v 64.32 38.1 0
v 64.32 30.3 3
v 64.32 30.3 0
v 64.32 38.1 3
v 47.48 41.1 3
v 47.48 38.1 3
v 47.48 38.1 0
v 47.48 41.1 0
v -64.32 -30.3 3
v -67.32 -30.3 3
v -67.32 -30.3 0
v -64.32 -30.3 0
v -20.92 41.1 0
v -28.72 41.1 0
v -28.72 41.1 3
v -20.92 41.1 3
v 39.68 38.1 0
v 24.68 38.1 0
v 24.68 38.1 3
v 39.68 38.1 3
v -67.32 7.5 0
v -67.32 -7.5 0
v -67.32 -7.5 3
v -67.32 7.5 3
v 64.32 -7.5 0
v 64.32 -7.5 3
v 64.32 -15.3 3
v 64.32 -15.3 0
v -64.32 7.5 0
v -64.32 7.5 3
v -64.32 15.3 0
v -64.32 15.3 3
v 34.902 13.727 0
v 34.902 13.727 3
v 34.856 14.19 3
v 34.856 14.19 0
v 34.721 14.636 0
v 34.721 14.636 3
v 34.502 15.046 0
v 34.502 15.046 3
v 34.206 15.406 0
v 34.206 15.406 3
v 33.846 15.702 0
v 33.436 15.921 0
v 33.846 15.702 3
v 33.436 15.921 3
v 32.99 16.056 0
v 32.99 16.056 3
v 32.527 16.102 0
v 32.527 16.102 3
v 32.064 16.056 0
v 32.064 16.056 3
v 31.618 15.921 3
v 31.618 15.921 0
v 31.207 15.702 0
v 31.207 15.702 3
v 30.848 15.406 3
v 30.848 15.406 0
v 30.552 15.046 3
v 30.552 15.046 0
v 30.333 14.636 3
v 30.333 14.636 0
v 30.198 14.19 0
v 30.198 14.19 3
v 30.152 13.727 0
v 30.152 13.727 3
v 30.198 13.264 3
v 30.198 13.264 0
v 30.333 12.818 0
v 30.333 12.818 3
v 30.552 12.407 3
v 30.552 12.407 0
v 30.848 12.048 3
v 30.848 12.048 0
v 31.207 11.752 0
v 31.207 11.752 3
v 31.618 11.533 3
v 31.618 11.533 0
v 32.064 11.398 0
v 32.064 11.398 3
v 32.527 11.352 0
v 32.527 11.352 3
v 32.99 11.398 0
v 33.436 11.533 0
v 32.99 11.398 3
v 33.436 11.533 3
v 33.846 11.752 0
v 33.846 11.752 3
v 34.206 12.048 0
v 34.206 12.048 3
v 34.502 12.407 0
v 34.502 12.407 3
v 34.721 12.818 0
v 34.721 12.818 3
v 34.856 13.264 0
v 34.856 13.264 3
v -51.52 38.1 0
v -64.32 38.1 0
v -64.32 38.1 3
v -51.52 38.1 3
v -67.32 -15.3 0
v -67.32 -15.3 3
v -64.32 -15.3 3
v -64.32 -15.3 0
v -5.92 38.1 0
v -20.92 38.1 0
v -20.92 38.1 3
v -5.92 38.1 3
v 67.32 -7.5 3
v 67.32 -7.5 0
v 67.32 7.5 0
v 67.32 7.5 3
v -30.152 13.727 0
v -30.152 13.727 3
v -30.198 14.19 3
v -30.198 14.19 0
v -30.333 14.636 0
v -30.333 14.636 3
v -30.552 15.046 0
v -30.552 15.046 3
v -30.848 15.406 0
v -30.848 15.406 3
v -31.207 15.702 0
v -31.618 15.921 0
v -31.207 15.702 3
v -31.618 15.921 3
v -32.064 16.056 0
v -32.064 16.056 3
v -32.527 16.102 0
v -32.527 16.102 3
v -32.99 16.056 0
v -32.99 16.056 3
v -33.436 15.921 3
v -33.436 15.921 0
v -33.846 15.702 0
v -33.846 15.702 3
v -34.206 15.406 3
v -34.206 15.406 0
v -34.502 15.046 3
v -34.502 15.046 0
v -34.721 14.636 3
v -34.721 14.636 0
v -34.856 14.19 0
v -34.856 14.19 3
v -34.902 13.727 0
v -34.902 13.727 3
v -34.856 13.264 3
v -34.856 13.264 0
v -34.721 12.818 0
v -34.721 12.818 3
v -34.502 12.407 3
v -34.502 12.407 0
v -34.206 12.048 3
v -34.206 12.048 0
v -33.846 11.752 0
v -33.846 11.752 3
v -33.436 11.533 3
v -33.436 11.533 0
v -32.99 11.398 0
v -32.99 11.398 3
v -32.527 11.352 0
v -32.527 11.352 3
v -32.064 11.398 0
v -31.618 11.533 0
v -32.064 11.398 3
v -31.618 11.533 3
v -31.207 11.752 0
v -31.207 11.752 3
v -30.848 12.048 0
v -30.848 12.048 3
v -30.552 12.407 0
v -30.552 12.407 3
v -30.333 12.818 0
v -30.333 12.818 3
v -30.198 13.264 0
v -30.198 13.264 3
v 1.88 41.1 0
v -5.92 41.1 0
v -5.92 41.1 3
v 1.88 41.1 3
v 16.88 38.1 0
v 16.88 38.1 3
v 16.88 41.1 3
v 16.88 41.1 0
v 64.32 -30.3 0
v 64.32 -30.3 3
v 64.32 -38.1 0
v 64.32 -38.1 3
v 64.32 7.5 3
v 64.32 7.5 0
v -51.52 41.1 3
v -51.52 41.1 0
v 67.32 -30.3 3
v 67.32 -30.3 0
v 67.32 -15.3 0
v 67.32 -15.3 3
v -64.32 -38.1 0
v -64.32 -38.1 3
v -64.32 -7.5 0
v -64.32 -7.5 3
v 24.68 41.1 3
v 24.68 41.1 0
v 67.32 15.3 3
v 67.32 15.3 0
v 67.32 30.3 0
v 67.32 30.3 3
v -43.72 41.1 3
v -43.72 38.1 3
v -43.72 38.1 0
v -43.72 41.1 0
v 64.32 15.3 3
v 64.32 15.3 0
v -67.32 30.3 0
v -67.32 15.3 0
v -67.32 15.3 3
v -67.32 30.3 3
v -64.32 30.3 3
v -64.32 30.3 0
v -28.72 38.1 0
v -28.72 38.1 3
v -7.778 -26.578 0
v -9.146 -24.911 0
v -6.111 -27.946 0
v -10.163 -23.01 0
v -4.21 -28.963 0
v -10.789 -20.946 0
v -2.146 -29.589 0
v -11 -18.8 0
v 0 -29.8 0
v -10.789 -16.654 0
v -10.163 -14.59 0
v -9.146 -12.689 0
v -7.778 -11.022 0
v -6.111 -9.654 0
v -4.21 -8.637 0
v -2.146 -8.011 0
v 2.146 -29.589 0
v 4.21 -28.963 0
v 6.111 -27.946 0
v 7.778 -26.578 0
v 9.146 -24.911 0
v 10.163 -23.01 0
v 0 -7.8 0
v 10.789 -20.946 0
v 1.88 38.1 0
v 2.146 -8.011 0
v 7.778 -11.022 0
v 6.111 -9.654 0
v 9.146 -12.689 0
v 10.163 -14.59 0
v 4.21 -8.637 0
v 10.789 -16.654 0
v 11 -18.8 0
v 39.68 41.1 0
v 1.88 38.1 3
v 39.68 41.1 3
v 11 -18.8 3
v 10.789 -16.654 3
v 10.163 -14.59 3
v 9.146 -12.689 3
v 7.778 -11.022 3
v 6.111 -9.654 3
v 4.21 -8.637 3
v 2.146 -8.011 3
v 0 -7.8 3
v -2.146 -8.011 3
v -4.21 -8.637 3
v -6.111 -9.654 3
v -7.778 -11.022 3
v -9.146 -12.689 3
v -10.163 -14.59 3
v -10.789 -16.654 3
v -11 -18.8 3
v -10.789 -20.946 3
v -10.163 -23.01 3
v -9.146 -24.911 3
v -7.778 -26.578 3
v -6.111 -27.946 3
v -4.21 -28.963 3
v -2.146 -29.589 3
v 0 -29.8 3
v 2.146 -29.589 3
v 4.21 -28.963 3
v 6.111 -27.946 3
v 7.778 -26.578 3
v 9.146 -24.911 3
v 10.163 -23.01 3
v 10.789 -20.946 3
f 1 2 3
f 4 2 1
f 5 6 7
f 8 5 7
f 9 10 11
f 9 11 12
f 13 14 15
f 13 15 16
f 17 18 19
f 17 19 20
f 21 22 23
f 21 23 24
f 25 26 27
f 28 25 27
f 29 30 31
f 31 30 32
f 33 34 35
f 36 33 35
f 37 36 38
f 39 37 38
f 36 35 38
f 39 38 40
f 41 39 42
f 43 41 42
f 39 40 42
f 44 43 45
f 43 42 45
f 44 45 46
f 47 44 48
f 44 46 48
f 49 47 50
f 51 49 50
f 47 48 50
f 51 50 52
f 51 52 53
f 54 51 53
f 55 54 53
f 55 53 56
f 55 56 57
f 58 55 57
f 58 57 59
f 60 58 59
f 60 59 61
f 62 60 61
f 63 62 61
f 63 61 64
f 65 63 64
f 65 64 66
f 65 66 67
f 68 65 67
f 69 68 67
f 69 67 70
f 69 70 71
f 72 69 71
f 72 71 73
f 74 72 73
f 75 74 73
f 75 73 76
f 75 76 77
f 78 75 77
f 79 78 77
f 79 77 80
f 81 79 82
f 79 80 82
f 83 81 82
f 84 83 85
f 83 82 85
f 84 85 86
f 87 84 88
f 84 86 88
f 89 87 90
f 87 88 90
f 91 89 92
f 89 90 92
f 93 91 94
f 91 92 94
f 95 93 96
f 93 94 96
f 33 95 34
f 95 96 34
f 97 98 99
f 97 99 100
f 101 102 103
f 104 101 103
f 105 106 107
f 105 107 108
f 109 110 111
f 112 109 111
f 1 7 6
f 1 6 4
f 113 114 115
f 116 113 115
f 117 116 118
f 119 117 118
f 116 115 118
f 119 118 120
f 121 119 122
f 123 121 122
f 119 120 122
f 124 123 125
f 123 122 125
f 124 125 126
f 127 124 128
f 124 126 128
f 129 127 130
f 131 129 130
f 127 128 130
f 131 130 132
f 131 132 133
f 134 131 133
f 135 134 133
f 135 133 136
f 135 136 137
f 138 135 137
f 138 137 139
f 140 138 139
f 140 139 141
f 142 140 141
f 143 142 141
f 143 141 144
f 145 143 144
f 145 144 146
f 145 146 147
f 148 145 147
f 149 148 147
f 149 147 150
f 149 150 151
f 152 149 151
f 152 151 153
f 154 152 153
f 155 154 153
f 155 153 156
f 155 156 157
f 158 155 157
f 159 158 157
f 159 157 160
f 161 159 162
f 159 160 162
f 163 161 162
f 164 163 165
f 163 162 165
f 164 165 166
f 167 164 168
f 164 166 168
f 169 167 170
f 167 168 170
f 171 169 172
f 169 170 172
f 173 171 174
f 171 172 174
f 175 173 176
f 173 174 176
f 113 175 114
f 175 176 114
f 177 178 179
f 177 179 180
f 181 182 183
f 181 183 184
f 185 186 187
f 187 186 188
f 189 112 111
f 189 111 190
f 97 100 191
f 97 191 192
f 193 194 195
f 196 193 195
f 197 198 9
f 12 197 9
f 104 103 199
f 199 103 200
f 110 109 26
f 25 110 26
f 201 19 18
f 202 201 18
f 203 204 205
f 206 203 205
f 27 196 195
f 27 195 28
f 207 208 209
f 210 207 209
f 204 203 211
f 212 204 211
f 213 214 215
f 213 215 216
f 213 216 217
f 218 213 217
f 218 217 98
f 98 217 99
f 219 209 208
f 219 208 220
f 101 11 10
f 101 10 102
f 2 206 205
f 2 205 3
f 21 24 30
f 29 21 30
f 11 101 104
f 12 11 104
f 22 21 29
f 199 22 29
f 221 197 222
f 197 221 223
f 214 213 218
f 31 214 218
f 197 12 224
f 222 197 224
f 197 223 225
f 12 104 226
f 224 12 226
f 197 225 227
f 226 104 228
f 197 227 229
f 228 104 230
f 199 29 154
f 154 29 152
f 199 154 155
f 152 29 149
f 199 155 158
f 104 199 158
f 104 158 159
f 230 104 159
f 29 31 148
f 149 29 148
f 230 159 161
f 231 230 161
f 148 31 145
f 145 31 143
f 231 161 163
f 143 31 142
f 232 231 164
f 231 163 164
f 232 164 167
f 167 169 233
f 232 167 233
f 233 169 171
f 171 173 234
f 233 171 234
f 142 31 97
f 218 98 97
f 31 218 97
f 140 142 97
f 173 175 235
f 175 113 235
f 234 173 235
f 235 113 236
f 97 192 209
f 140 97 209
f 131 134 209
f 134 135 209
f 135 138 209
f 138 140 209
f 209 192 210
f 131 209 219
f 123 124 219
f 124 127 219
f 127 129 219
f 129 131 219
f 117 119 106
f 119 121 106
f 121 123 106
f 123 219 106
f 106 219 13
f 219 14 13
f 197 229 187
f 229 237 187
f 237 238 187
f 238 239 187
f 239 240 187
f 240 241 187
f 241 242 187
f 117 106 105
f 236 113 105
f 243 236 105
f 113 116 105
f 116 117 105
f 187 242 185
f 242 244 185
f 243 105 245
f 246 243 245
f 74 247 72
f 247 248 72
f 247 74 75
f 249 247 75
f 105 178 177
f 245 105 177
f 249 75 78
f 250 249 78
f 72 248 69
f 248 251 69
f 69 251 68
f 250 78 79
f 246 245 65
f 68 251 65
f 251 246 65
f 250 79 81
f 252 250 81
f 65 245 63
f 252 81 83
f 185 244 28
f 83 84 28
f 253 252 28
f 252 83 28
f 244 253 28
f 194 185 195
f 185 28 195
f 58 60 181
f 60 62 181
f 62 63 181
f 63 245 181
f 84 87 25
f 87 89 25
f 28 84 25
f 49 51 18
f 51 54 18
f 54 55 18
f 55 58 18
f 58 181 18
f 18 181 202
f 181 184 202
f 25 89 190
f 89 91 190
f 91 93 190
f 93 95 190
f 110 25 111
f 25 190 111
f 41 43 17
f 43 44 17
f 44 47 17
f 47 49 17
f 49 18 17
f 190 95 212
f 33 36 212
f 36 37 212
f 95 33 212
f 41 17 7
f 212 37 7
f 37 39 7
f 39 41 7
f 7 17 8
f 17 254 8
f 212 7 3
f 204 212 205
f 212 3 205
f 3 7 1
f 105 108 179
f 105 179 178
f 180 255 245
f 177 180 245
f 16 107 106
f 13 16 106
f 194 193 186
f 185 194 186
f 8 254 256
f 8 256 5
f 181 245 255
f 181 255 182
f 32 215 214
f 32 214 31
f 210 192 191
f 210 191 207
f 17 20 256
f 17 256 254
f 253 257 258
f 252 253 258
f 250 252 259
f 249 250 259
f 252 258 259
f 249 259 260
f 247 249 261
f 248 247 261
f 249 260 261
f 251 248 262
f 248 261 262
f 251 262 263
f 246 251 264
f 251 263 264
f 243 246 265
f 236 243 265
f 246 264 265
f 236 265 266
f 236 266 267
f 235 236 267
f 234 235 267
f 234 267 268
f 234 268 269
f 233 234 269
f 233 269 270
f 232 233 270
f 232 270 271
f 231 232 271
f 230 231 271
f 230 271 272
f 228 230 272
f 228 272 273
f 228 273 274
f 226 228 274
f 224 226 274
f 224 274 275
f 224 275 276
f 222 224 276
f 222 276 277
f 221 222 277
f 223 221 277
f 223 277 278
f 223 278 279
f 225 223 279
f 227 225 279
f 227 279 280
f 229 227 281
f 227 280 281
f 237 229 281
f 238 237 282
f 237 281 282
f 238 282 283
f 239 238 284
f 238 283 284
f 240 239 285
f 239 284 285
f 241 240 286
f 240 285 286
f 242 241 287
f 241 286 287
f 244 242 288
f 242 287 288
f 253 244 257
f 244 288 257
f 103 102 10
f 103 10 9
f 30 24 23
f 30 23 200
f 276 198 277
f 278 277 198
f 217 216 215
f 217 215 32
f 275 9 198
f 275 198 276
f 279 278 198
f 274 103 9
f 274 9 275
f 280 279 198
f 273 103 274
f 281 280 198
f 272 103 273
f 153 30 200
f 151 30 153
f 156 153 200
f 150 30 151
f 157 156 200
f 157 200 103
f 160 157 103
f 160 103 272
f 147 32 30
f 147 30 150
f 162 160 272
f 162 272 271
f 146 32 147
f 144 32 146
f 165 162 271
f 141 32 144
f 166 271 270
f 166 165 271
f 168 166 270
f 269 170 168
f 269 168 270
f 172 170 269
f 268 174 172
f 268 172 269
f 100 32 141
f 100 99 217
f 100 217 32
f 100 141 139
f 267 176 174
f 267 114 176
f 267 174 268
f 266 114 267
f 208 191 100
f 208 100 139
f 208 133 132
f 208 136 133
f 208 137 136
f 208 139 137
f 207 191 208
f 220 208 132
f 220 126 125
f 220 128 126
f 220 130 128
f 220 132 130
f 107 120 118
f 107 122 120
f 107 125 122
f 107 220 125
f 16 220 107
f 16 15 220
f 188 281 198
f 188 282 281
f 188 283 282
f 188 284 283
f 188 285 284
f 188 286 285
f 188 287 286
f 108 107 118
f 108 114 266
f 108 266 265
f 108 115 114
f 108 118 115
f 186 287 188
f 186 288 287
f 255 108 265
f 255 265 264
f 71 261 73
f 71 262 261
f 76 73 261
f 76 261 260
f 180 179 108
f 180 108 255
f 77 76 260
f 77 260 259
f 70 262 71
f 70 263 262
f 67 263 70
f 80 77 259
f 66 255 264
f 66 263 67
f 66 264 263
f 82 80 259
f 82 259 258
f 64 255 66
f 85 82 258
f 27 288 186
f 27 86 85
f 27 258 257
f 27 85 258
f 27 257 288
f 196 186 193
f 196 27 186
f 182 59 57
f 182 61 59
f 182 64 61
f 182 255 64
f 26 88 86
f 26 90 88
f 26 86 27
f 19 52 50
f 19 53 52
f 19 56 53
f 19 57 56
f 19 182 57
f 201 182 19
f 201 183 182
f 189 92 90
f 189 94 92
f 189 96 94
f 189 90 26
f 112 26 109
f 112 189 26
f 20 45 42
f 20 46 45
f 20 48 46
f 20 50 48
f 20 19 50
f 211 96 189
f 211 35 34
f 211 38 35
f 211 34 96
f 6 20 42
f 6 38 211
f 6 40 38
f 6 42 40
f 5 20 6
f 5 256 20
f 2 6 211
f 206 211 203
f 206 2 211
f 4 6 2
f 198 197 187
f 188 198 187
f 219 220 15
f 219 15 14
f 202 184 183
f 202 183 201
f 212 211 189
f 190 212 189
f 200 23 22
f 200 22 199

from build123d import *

# Parameters (mm, degrees)
SKETCH1_W               = 134.64
SKETCH1_H               = 76.2
BOSS_EXTRUDE1_DEPTH     = 3
SKETCH2_W               = 3
SKETCH2_H               = 7.8
CUT_EXTRUDE1_DEPTH      = 78.411836304
LPATTERN1_COUNT         = 4
LPATTERN1_PITCH         = 22.8
MIRROR4_COPY_1_SKETCH_W = 3
MIRROR4_COPY_1_SKETCH_H = 7.8
MIRROR4_COPY_1_DEPTH    = 78.411836304
MIRROR4_COPY_2_SKETCH_W = 3
MIRROR4_COPY_2_SKETCH_H = 7.8
MIRROR4_COPY_2_DEPTH    = 78.411836304
MIRROR4_COPY_3_SKETCH_W = 3
MIRROR4_COPY_3_SKETCH_H = 7.8
MIRROR4_COPY_3_DEPTH    = 78.411836304
SKETCH3_W               = 7.8
SKETCH3_H               = 3
BOSS_EXTRUDE2_DEPTH     = 3
LPATTERN2_COUNT         = 5
LPATTERN2_PITCH         = 22.8
SKETCH4_R               = 11
CUT_EXTRUDE2_DEPTH      = 79.931567829
SKETCH5_R               = 2.3749
CUT_EXTRUDE3_DEPTH      = 79.931567829


with BuildPart() as part:
    # Sketch1 → Boss-Extrude1 (new body)
    with BuildSketch(Plane.XY):
        Rectangle(SKETCH1_W, SKETCH1_H)
    extrude(amount=BOSS_EXTRUDE1_DEPTH)

    # Sketch2 → Cut-Extrude1 (cut, through all)
    with BuildSketch(Plane.XY.offset(3)):
        with Locations((-65.82, 34.2)):
            Rectangle(SKETCH2_W, SKETCH2_H)
    cut_extrude1 = extrude(amount=-CUT_EXTRUDE1_DEPTH, mode=Mode.SUBTRACT)

    # LPattern1: Cut-Extrude1 ×4
    with Locations(*[(0, -i * LPATTERN1_PITCH, 0) for i in range(1, LPATTERN1_COUNT)]):
        add(cut_extrude1, mode=Mode.SUBTRACT)

    # Mirror4: Cut-Extrude1 across plane
    add(cut_extrude1.mirror(Plane(origin=(0, 0, 0), x_dir=(0, 0, 1), z_dir=(1, 0, 0))), mode=Mode.SUBTRACT)

    # Mirror4 copy 1 sketch → Mirror4 copy 1 (cut, through all)
    with BuildSketch(Plane(origin=(0, -22.8, 3), x_dir=(-1, 0, 0), z_dir=(0, 0, 1))):
        with Locations((-65.82, -34.2)):
            Rectangle(MIRROR4_COPY_1_SKETCH_W, MIRROR4_COPY_1_SKETCH_H)
    extrude(amount=-MIRROR4_COPY_1_DEPTH, mode=Mode.SUBTRACT)

    # Mirror4 copy 2 sketch → Mirror4 copy 2 (cut, through all)
    with BuildSketch(Plane(origin=(0, -45.6, 3), x_dir=(-1, 0, 0), z_dir=(0, 0, 1))):
        with Locations((-65.82, -34.2)):
            Rectangle(MIRROR4_COPY_2_SKETCH_W, MIRROR4_COPY_2_SKETCH_H)
    extrude(amount=-MIRROR4_COPY_2_DEPTH, mode=Mode.SUBTRACT)

    # Mirror4 copy 3 sketch → Mirror4 copy 3 (cut, through all)
    with BuildSketch(Plane(origin=(0, -68.4, 3), x_dir=(-1, 0, 0), z_dir=(0, 0, 1))):
        with Locations((-65.82, -34.2)):
            Rectangle(MIRROR4_COPY_3_SKETCH_W, MIRROR4_COPY_3_SKETCH_H)
    extrude(amount=-MIRROR4_COPY_3_DEPTH, mode=Mode.SUBTRACT)

    # Sketch3 → Boss-Extrude2 (add)
    with BuildSketch(Plane(origin=(0, 38.1, 0), x_dir=(1, 0, 0), z_dir=(0, 1, 0))):
        with Locations((-47.62, -1.5)):
            Rectangle(SKETCH3_W, SKETCH3_H)
    boss_extrude2 = extrude(amount=BOSS_EXTRUDE2_DEPTH)

    # LPattern2: Boss-Extrude2 ×5
    with Locations(*[(i * LPATTERN2_PITCH, 0, 0) for i in range(1, LPATTERN2_COUNT)]):
        add(boss_extrude2)

    # Sketch4 → Cut-Extrude2 (cut, through all)
    with BuildSketch(Plane.XY.offset(3)):
        with Locations((0, -18.8)):
            Circle(SKETCH4_R)
    extrude(amount=-CUT_EXTRUDE2_DEPTH, mode=Mode.SUBTRACT)

    # Sketch5 → Cut-Extrude3 (cut, through all)
    with BuildSketch(Plane.XY.offset(3)):
        with Locations((32.526911935, 13.726911935)):
            Circle(SKETCH5_R)
        with Locations((-32.526911935, 13.726911935)):
            Circle(SKETCH5_R)
    extrude(amount=-CUT_EXTRUDE3_DEPTH, mode=Mode.SUBTRACT)


solid = part.part
